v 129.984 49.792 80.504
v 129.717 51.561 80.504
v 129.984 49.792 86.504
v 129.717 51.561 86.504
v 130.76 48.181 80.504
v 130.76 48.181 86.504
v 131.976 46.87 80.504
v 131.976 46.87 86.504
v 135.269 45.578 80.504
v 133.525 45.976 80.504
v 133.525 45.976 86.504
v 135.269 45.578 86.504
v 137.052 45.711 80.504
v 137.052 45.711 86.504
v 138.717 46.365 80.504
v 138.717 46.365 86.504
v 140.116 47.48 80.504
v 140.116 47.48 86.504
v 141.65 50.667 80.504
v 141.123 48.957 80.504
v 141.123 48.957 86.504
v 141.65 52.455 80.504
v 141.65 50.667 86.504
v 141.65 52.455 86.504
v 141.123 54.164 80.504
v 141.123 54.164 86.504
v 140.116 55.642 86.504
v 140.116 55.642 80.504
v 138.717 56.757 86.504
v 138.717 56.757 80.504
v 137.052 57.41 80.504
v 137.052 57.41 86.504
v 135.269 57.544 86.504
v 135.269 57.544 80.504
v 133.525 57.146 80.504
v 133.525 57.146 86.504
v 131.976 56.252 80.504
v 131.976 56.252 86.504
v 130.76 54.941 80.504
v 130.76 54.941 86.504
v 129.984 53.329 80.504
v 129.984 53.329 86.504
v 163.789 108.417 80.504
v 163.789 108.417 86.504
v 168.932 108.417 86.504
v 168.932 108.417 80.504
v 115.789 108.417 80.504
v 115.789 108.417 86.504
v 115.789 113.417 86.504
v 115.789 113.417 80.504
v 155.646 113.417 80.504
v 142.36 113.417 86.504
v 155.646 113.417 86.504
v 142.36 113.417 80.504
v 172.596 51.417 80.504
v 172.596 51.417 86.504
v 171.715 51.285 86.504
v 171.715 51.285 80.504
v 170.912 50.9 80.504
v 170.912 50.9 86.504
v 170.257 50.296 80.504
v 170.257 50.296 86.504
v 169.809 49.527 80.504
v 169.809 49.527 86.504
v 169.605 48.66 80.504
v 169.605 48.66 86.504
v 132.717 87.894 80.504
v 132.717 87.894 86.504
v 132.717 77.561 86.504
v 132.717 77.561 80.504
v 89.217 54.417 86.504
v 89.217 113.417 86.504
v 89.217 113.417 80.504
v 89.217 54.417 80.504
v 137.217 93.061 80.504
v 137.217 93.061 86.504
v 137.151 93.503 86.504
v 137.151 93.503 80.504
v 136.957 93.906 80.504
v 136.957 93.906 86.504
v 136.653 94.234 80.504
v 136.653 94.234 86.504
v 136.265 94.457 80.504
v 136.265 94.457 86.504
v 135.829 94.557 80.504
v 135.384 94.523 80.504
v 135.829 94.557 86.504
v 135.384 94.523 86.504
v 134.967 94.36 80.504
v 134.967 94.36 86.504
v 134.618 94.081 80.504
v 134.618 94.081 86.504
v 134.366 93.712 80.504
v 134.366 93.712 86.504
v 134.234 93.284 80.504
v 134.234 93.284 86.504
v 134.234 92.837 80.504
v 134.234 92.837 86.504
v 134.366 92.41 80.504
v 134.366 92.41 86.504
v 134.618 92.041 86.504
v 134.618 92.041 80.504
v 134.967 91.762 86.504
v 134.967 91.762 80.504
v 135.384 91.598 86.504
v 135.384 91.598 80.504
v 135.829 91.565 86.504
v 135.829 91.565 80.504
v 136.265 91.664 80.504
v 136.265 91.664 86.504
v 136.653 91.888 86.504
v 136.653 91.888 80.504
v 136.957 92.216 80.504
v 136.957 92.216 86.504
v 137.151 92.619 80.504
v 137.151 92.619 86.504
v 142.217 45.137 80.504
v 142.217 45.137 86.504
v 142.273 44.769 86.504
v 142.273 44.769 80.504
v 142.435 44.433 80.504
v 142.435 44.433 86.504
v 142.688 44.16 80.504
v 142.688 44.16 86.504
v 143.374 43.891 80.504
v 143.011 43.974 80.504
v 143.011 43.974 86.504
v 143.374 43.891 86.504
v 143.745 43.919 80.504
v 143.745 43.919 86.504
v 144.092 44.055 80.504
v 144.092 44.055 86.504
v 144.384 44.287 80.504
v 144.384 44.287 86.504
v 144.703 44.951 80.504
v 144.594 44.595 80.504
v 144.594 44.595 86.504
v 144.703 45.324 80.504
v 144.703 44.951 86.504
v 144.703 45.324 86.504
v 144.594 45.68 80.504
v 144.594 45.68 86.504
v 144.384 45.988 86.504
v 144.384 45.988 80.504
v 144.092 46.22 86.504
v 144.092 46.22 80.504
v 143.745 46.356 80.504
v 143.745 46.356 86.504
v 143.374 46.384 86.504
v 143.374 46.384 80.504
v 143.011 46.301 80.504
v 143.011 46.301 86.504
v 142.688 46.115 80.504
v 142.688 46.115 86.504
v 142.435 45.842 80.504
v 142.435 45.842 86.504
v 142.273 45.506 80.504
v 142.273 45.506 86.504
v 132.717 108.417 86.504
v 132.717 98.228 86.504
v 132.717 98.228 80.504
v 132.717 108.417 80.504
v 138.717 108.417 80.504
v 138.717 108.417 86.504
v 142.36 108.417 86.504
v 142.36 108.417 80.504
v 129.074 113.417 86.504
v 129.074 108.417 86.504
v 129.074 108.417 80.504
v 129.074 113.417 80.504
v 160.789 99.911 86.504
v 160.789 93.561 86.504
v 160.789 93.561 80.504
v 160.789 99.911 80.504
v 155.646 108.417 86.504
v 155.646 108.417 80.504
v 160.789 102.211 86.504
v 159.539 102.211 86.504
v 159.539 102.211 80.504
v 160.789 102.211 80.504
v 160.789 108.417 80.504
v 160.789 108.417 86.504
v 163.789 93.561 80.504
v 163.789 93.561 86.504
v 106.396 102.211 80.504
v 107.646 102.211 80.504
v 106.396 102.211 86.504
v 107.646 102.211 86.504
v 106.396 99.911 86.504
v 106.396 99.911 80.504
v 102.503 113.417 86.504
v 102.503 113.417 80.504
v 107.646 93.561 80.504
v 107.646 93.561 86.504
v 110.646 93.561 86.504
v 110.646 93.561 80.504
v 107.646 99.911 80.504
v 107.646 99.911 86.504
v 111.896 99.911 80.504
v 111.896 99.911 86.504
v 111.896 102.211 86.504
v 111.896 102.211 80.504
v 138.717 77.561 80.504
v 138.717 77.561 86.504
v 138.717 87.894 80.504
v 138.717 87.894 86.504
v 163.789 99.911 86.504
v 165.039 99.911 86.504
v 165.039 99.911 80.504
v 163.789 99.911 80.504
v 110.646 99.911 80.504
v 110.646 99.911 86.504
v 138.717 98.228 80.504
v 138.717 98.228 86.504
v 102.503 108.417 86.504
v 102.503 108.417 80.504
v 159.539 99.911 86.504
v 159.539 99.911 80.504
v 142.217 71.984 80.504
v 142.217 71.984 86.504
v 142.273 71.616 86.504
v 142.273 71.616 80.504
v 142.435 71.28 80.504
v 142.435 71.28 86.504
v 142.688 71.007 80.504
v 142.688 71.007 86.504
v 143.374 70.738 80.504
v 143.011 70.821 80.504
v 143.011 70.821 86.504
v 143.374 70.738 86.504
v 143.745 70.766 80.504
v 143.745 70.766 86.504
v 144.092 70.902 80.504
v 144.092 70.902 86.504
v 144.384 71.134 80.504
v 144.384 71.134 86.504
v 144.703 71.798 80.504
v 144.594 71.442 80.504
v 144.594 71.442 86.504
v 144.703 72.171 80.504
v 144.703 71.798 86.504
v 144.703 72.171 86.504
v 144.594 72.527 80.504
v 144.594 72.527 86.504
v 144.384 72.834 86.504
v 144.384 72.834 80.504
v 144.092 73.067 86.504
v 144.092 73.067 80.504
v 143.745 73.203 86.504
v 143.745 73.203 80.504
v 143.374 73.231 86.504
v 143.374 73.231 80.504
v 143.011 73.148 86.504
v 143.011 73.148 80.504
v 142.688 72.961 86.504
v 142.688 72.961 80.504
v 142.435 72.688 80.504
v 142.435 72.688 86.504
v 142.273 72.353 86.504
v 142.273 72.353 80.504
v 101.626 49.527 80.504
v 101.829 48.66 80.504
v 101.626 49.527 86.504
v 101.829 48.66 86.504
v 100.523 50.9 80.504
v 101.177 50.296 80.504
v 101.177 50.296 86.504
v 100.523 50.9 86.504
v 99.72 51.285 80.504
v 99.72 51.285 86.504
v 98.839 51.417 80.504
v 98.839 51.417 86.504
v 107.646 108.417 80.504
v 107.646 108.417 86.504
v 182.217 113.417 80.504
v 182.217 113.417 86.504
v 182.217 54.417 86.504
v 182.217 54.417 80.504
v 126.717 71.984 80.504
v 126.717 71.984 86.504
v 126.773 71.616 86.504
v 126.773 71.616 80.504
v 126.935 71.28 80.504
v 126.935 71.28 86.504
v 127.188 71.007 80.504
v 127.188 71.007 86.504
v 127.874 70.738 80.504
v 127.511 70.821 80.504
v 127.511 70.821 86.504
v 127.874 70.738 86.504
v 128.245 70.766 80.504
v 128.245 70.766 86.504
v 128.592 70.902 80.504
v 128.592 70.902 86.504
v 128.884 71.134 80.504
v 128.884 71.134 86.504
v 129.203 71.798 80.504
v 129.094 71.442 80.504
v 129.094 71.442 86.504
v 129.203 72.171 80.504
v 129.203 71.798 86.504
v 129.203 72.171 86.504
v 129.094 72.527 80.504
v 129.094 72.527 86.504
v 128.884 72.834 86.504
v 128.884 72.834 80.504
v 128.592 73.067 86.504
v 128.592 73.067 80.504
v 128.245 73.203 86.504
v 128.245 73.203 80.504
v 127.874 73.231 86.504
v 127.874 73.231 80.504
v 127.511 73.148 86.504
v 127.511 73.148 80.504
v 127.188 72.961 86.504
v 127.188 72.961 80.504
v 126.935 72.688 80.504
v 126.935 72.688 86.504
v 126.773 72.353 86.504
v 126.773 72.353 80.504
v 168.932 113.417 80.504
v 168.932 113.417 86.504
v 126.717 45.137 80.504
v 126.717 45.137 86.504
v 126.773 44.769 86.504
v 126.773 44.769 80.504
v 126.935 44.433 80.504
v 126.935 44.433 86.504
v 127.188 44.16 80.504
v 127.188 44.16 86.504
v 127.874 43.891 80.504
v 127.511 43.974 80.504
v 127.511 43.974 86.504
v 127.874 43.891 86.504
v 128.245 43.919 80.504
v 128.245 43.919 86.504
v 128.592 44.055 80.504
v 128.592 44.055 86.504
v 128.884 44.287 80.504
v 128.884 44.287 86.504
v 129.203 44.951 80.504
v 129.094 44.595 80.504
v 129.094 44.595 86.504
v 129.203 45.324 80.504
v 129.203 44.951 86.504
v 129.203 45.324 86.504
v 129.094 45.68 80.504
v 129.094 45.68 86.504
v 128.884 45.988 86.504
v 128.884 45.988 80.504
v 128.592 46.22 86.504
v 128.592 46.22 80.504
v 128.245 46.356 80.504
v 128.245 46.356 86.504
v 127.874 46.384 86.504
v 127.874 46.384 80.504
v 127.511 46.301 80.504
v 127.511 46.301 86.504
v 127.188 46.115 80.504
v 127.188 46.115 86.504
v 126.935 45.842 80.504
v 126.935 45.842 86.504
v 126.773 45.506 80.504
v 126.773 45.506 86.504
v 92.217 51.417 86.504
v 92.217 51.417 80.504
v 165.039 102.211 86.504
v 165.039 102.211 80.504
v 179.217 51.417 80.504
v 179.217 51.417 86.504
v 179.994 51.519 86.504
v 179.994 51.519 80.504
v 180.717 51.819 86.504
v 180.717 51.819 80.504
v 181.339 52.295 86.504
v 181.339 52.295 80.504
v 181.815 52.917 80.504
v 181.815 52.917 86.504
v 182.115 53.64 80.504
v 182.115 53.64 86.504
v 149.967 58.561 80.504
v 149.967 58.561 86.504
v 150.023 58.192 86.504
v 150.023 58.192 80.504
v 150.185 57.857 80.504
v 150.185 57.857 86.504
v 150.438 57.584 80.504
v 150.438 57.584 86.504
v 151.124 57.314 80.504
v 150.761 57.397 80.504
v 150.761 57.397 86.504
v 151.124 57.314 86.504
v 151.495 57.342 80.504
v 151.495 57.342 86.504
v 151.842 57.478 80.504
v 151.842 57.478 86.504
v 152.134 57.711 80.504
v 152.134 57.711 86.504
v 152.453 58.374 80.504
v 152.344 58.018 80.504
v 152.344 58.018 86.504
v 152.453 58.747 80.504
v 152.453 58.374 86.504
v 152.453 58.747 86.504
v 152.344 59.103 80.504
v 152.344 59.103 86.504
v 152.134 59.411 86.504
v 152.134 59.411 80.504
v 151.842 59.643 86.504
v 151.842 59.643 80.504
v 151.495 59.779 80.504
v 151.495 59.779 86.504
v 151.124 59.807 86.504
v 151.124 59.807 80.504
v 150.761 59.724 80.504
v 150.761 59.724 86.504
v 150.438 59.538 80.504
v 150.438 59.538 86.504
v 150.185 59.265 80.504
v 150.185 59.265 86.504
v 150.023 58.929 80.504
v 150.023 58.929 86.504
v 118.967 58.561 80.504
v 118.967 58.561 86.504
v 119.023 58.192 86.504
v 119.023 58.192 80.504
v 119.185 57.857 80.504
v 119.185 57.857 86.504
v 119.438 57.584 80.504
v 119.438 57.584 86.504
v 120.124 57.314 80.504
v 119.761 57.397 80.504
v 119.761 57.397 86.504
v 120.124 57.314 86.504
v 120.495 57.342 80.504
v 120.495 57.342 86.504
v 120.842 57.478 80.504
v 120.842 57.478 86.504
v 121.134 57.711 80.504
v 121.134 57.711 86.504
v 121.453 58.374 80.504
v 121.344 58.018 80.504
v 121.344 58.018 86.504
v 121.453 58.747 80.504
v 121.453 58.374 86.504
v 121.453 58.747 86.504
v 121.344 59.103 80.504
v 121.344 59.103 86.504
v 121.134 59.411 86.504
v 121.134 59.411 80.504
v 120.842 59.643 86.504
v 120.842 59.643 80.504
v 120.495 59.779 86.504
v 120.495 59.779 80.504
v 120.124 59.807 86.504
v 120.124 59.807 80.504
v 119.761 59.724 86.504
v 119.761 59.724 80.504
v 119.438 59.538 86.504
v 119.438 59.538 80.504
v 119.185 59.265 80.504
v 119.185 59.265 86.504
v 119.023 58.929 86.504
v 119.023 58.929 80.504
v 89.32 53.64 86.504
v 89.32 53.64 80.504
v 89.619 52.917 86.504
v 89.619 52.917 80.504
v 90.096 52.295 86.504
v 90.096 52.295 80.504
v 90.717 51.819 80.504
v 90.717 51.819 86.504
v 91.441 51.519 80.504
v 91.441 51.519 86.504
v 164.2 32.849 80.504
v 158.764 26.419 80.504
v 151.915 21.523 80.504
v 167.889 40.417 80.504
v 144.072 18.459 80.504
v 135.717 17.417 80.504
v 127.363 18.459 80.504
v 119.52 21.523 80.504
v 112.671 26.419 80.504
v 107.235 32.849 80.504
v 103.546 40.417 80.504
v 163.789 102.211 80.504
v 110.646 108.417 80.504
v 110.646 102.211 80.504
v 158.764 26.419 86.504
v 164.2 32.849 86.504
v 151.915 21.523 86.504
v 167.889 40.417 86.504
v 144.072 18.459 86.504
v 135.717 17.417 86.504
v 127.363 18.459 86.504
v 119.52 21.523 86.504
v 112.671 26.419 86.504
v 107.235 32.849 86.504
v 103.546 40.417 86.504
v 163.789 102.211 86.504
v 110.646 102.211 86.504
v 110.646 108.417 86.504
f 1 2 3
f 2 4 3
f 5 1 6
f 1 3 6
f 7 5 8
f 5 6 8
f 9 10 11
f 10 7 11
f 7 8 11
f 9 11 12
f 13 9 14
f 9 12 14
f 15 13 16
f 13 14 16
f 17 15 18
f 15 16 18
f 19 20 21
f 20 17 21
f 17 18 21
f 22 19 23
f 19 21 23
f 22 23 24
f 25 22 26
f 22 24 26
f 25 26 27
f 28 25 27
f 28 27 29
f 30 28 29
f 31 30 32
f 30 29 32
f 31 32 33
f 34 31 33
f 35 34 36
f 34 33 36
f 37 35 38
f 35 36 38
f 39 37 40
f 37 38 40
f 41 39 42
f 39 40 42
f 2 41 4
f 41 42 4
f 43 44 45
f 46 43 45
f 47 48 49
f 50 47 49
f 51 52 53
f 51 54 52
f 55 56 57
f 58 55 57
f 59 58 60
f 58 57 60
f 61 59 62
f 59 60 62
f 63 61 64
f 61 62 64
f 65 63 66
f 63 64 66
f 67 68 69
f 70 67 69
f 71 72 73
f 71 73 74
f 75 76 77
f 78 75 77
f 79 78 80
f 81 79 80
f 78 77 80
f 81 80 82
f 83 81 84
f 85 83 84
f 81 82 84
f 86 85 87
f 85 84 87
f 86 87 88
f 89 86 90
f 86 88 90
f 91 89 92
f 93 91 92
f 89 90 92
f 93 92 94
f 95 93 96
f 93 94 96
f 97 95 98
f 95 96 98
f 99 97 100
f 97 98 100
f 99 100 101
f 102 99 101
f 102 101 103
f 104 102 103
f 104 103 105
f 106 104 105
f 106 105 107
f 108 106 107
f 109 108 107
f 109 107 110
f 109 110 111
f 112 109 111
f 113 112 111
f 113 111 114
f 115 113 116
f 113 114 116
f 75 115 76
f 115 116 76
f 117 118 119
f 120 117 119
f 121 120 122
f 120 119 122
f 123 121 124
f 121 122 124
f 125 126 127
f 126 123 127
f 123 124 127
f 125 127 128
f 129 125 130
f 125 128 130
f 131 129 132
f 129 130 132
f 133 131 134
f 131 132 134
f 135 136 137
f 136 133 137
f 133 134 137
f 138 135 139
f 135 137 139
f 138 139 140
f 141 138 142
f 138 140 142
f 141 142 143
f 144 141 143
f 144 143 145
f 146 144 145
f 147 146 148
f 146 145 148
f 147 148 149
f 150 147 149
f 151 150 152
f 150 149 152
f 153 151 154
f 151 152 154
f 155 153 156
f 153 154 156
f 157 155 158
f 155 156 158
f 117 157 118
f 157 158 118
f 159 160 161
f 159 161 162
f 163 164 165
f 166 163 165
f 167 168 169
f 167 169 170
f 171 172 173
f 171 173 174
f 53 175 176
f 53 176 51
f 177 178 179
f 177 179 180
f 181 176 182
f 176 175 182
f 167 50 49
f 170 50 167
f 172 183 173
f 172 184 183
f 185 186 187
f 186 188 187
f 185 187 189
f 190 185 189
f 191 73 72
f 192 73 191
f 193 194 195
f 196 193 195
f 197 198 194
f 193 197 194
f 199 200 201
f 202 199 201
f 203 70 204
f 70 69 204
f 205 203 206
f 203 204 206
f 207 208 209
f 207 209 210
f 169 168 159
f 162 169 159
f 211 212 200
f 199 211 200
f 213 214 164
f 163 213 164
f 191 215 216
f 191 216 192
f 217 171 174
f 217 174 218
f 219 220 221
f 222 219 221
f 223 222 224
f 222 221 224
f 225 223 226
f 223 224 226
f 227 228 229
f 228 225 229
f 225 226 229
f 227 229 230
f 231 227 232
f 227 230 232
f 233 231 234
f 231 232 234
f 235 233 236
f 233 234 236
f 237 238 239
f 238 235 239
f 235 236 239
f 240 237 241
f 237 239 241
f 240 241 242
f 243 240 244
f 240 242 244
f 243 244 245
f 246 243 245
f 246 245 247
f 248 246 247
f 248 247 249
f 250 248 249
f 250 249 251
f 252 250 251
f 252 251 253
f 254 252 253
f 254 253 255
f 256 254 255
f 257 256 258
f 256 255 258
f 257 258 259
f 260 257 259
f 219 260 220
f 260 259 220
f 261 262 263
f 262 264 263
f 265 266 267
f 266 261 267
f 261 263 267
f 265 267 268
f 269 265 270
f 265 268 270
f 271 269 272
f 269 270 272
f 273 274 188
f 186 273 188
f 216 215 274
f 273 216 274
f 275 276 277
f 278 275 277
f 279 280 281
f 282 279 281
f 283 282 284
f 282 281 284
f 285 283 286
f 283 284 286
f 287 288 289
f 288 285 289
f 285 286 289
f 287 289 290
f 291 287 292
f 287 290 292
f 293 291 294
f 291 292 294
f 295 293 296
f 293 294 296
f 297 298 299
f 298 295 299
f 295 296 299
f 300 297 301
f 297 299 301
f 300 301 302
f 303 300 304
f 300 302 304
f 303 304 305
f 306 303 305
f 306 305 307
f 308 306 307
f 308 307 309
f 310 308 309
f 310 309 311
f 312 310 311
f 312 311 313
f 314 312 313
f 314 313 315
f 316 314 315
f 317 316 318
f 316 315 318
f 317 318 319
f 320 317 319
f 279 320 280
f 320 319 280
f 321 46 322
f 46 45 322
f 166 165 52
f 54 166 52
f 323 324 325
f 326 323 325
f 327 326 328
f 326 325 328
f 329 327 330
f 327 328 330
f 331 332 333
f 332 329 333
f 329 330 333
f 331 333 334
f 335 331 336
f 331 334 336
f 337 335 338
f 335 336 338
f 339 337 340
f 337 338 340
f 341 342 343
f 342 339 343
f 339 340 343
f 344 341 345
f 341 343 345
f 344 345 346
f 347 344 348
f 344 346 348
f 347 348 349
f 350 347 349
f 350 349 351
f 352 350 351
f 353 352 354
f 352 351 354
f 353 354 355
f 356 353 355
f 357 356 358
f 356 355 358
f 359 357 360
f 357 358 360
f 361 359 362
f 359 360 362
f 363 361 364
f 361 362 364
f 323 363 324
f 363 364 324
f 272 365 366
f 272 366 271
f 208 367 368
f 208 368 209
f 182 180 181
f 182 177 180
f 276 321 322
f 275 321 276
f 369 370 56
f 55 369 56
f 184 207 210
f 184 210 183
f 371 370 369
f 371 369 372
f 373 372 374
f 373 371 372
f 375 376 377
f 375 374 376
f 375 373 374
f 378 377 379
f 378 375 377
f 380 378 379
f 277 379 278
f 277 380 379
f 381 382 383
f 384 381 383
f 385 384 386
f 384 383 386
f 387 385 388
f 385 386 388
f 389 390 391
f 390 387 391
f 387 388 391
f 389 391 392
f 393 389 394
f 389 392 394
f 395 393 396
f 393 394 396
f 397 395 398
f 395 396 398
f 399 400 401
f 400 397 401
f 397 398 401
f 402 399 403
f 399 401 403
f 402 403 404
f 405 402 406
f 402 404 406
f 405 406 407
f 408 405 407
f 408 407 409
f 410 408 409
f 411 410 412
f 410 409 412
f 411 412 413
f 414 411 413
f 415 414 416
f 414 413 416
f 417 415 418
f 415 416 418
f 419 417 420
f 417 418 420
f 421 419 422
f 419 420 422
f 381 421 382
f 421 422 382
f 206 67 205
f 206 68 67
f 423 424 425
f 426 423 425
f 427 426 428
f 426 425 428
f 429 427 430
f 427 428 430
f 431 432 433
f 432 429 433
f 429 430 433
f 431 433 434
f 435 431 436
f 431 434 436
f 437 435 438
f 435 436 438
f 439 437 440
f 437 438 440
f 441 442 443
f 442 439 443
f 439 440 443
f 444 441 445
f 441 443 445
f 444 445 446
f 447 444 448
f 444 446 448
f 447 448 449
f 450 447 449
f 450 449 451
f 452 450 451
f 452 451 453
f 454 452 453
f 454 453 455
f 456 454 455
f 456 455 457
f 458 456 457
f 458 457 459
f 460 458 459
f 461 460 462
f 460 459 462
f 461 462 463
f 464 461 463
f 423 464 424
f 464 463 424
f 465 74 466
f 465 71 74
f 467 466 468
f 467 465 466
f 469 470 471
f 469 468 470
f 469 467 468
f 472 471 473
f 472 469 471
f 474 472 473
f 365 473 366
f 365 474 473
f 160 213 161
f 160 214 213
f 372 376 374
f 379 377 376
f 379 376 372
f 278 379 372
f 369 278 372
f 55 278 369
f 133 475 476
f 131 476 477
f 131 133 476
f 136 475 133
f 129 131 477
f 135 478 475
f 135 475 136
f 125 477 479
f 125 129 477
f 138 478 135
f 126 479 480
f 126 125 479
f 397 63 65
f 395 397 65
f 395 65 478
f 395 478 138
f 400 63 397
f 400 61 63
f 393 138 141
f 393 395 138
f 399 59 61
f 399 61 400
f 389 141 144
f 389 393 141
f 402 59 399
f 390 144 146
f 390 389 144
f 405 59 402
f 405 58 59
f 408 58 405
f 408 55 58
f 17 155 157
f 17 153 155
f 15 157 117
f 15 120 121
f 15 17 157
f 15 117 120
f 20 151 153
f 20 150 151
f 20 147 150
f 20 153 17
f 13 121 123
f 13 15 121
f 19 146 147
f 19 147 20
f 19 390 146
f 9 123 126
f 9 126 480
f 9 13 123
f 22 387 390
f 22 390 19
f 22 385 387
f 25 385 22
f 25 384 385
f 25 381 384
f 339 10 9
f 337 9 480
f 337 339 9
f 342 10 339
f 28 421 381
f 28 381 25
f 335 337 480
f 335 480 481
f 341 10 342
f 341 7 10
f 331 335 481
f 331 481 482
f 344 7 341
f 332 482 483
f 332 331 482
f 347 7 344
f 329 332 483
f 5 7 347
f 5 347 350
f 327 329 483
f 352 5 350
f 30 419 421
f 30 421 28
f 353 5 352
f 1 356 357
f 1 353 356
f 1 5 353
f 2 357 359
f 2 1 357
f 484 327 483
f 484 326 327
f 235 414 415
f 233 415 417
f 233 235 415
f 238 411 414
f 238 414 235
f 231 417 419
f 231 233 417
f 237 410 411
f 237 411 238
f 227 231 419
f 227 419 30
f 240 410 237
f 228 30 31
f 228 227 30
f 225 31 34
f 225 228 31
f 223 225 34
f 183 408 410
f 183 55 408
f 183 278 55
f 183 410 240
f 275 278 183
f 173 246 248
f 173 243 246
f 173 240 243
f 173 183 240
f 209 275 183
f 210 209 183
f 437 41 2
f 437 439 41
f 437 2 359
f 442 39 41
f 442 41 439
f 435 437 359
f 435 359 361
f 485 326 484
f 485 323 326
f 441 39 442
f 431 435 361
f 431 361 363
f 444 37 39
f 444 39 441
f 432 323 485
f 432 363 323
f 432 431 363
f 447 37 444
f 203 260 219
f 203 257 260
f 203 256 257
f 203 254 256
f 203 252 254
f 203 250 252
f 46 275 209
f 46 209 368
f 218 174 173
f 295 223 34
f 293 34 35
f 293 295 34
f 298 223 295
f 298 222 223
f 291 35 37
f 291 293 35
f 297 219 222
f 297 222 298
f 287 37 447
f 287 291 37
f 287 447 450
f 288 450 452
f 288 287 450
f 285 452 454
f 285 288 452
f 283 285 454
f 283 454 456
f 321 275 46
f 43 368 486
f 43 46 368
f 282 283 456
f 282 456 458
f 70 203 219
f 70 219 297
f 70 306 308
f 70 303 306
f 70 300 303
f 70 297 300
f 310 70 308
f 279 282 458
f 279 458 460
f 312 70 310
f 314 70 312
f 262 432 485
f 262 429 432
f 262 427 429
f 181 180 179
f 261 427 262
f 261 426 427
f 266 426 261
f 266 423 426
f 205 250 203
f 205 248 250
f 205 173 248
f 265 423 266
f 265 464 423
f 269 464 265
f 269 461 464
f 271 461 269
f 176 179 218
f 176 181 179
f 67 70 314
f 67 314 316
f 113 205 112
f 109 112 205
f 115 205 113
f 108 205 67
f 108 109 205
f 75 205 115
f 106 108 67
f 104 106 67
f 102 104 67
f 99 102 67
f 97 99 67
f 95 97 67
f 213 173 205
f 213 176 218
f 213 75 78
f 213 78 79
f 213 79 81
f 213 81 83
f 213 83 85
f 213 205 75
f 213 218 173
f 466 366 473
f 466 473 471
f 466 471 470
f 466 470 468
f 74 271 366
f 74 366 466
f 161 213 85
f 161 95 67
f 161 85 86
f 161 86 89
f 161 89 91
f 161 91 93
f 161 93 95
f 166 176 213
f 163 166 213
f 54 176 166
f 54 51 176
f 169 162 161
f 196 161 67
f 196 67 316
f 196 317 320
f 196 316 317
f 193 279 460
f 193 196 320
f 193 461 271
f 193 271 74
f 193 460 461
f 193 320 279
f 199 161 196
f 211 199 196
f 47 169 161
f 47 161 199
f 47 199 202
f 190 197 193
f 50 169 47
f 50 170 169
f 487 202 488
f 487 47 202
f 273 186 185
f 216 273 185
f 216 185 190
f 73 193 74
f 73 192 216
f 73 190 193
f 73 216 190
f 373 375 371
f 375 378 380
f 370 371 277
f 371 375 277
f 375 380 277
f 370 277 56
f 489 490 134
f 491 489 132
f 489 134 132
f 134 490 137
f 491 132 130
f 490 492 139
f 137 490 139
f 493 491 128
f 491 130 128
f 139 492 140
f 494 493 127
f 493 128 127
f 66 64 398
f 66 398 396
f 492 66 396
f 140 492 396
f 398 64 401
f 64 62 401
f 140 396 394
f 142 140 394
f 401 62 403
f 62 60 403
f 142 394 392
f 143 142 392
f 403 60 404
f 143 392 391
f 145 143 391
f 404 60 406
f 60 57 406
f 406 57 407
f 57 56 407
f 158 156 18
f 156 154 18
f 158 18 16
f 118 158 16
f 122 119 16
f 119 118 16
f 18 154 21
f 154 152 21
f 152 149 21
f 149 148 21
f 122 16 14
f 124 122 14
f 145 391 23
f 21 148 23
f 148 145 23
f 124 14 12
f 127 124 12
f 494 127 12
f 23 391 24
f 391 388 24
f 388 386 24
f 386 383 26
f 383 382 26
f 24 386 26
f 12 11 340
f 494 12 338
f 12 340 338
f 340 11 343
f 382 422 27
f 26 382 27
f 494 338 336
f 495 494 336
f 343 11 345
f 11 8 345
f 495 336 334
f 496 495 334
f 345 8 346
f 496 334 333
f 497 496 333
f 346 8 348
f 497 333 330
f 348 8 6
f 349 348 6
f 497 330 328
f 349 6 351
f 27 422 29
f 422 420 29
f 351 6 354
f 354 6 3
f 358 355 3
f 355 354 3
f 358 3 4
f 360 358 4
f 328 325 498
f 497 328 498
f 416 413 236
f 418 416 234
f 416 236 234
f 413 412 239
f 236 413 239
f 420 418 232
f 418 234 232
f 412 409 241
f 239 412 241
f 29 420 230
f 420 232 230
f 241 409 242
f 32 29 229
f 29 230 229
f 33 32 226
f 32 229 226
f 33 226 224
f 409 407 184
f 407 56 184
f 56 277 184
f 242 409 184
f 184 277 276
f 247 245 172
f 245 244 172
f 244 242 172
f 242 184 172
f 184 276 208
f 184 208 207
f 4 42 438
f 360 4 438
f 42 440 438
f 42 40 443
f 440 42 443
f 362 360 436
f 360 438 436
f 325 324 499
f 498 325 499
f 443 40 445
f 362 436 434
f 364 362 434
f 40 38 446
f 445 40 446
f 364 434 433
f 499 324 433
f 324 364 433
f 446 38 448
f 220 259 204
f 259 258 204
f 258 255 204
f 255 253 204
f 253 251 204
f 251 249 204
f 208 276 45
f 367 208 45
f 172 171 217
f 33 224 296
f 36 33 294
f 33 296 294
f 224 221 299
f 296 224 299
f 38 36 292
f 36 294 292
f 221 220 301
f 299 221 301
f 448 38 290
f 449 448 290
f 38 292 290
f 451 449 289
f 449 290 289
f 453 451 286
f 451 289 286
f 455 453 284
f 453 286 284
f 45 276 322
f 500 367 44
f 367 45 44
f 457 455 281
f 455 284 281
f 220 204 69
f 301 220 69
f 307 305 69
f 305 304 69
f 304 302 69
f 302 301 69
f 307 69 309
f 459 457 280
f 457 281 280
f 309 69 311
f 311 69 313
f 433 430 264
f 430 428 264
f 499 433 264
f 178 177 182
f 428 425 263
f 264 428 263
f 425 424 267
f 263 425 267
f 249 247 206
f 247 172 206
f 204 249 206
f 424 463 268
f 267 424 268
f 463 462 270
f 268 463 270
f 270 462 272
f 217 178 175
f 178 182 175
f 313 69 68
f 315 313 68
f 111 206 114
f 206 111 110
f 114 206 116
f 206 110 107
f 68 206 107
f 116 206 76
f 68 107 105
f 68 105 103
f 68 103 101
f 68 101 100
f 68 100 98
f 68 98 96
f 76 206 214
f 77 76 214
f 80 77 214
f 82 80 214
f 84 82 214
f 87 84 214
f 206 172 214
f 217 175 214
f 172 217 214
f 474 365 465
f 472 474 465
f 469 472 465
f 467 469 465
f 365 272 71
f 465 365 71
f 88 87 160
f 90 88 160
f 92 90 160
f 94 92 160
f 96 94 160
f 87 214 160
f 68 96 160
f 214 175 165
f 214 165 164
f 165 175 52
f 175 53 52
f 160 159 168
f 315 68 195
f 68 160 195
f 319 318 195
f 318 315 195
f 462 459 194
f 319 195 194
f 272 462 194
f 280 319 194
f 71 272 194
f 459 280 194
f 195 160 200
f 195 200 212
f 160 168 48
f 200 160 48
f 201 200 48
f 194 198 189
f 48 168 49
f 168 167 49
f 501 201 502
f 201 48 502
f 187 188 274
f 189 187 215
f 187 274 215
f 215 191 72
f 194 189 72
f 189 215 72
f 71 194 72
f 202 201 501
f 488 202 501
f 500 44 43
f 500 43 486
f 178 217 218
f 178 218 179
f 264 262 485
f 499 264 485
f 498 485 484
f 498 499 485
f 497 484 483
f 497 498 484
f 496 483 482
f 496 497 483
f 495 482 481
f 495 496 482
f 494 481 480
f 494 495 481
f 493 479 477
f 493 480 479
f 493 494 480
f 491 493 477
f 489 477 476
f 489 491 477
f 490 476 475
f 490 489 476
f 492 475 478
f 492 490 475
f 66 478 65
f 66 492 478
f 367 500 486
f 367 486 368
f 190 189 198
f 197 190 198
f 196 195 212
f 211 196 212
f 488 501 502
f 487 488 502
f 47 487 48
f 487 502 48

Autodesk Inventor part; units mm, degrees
ref_plane "YZ Plane" through (0, 0, 0) normal (1, 0, 0) x (0, 1, 0)
ref_plane "XZ Plane" through (0, 0, 0) normal (0, 1, 0) x (-1, 0, 0)
ref_plane "РабПлоскость1" through (89.2173, 100.7825, 86.5043) normal (0, 0, -1) x (-1, 0, 0)
sketch "Эскиз1" plane through (89.2173, 100.7825, 86.5043) normal (0, 0, -1) x (-1, 0, 0)
  line L0 (0, 7.6342) -> (-13.2857, 7.6342) construction
  line L1 (0, 7.6342) -> (0, 13.6342) projected
  line L2 (-13.2857, 13.6342) -> (0, 13.6342) projected
  line L3 (-13.2857, 7.6342) -> (-13.2857, 13.6342) projected
  line L4 (-26.5714, 7.6342) -> (-39.8571, 7.6342) construction
  line L5 (-26.5714, 7.6342) -> (-26.5714, 13.6342) projected
  line L6 (-39.8571, 13.6342) -> (-26.5714, 13.6342) projected
  line L7 (-39.8571, 7.6342) -> (-39.8571, 13.6342) projected
  line L8 (-53.1429, 7.6342) -> (-66.4286, 7.6342) construction
  line L9 (-53.1429, 7.6342) -> (-53.1429, 13.6342) projected
  line L10 (-66.4286, 13.6342) -> (-53.1429, 13.6342) projected
  line L11 (-66.4286, 7.6342) -> (-66.4286, 13.6342) projected
  line L12 (-79.7143, 7.6342) -> (-93, 7.6342) construction
  line L13 (-79.7143, 7.6342) -> (-79.7143, 13.6342) projected
  line L14 (-93, 13.6342) -> (-79.7143, 13.6342) projected
  line L15 (-93, 7.6342) -> (-93, 13.6342) projected
  line L16 (-13.2857, 7.6342) -> (-26.5714, 7.6342)
  line L17 (-39.8571, 7.6342) -> (-53.1429, 7.6342)
  line L18 (-66.4286, 7.6342) -> (-79.7143, 7.6342)
  line L19 (0, 7.6342) -> (0, -46.3658)
  line L20 (-3, -49.3658) -> (-9.6218, -49.3658)
  line L21 (-93, 7.6342) -> (-93, -46.3658)
  line L22 (-90, -49.3658) -> (-83.3782, -49.3658)
  line L23 (-12.5, -49.3658) -> (-80.5, -49.3658) construction
  arc A0 (-80.3881, -52.1226) -> (-12.6119, -52.1226) centre (-46.5, -49.3658) ccw
  arc A1 (-9.6218, -49.3658) -> (-12.6119, -52.1226) centre (-9.6218, -52.3658) ccw
  arc A2 (-80.3881, -52.1226) -> (-83.3782, -49.3658) centre (-83.3782, -52.3658) ccw
  arc A3 (-93, -46.3658) -> (-90, -49.3658) centre (-90, -46.3658) ccw
  arc A4 (-3, -49.3658) -> (0, -46.3658) centre (-3, -46.3658) ccw
  circle A5 centre (-46.5, -49.2217) radius 6
  circle A6 centre (-62, -42.2217) radius 1.25
  circle A7 centre (-54.25, -55.6451) radius 1.25
  circle A8 centre (-38.75, -55.6451) radius 1.25
  circle A9 centre (-31, -42.2217) radius 1.25
  circle A10 centre (-38.75, -28.7983) radius 1.25
  circle A11 centre (-54.25, -28.7983) radius 1.25
  point P0 (89.2173, -100.7825)
  point P1 (-93, -49.3658)
  dimension "d0" = 57
  dimension "d1" = 34
  dimension "d2" = 3
  dimension "d3" = 6
ref_plane "РабПлоскость2" through (219.2173, 403.7825, -131.4957) normal (0, 0, -1) x (-1, 0, 0)
extrude "Выдавливание1" add sketch "Эскиз1" along normal blind 6
sketch "Эскиз2" plane through (89.2173, 100.7825, 86.5043) normal (0, 0, 1) x (1, 0, 0)
  circle A0 centre (46.5, -42.2217) radius 19
  line L0 (49.5, -2.555) -> (43.5, -2.555)
  line L1 (43.5, -2.555) -> (43.5, -12.8884) construction
  line L2 (43.5, -12.8884) -> (49.5, -12.8884)
  line L3 (49.5, -12.8884) -> (49.5, -2.555) construction
  line L4 (49.5, -12.8884) -> (46.5, -42.2217) construction
  line L5 (46.5, -42.2217) -> (43.5, -12.8884) construction
  line L6 (49.5, -12.8884) -> (43.5, -2.555) construction
  line L7 (43.5, -12.8884) -> (43.5, -23.2217)
  line L8 (43.5, -23.2217) -> (49.5, -23.2217)
  line L9 (49.5, -23.2217) -> (49.5, -12.8884)
  line L10 (43.5, -2.555) -> (43.5, 7.7783)
  line L11 (49.5, -2.555) -> (49.5, 7.7783)
  circle A1 centre (46.5, -7.7217) radius 1.5
  line L12 (18.4286, 7.7783) -> (18.4286, 13.7783) construction
  line L13 (21.4286, 7.7783) -> (21.4286, 13.7783) construction
  line L14 (71.5714, 7.7783) -> (71.5714, 13.7783) construction
  line L15 (74.5714, 7.7783) -> (74.5714, 13.7783) construction
  line L16 (43.5, 7.7783) -> (49.5, 7.7783)
  line L17 (18.4286, 7.7783) -> (18.4286, 1.4283)
  line L18 (18.4286, 1.4283) -> (17.1786, 1.4283)
  line L19 (17.1786, 1.4283) -> (17.1786, -0.8717)
  line L20 (17.1786, -0.8717) -> (18.4286, -0.8717)
  line L21 (18.4286, -0.8717) -> (18.4286, -7.2217)
  line L22 (18.4286, -7.2217) -> (21.4286, -7.2217)
  line L23 (21.4286, -7.2217) -> (21.4286, -0.8717)
  line L24 (21.4286, -0.8717) -> (22.6786, -0.8717)
  line L25 (22.6786, -0.8717) -> (22.6786, 1.4283)
  line L26 (22.6786, 1.4283) -> (21.4286, 1.4283)
  line L27 (21.4286, 1.4283) -> (21.4286, 7.7783)
  line L28 (18.4286, 7.7783) -> (21.4286, 7.7783)
  line L29 (46.5, 7.7783) -> (46.5, -2.555) construction
  line L30 (74.5714, 7.7783) -> (74.5714, 1.4283)
  line L31 (74.5714, 1.4283) -> (75.8214, 1.4283)
  line L32 (75.8214, 1.4283) -> (75.8214, -0.8717)
  line L33 (75.8214, -0.8717) -> (74.5714, -0.8717)
  line L34 (74.5714, -0.8717) -> (74.5714, -7.2217)
  line L35 (74.5714, -7.2217) -> (71.5714, -7.2217)
  line L36 (71.5714, -7.2217) -> (71.5714, -0.8717)
  line L37 (71.5714, -0.8717) -> (70.3214, -0.8717)
  line L38 (70.3214, -0.8717) -> (70.3214, 1.4283)
  line L39 (70.3214, 1.4283) -> (71.5714, 1.4283)
  line L40 (71.5714, 1.4283) -> (71.5714, 7.7783)
  line L41 (71.5714, 7.7783) -> (74.5714, 7.7783)
  line L42 (335, 7.7783) -> (-15, 7.7783) construction
  point P0 (-89.2173, -100.7825)
  dimension "d19" = 6
  dimension "d21" = 3
  dimension "d22" = 5.5
  dimension "d23" = 2.3
  dimension "d26" = 15
extrude "Выдавливание2" cut sketch "Эскиз2" against normal blind 6 contours L8 L7 L2 L9 | L0 L10 L16 L11 | A1 | L28 L27 L26 L25 L24 L23 L22 L21 L20 L19 L18 L17 | L30 L31 L32 L33 L34 L35 L36 L37 L38 L39 L40 L41
sketch "Эскиз4" plane through (168.9316, 114.4167, 86.5043) normal (0, 1, 0) x (1, 0, 0)
  line L0 (13.2857, 6) -> (10.2857, 6) projected
  line L1 (-79.7143, 0) -> (-79.7143, 6) projected
  line L2 (13.2857, 6) -> (-79.7143, 6)
  line L3 (-79.7143, 6) -> (-79.7143, 0)
  line L4 (-79.7143, 0) -> (13.2857, 0)
  line L5 (13.2857, 0) -> (13.2857, 6)
  point P0 (-168.9316, 86.5043)
  point P1 (10.2857, 6)
  point P2 (-79.7143, 6)
extrude "Выдавливание3" cut sketch "Эскиз4" against normal blind 1
equation "\"d5\" = d3"
equation "\"d19\" = d3"
equation "\"d14\" = d3"
properties part number "motor3"
